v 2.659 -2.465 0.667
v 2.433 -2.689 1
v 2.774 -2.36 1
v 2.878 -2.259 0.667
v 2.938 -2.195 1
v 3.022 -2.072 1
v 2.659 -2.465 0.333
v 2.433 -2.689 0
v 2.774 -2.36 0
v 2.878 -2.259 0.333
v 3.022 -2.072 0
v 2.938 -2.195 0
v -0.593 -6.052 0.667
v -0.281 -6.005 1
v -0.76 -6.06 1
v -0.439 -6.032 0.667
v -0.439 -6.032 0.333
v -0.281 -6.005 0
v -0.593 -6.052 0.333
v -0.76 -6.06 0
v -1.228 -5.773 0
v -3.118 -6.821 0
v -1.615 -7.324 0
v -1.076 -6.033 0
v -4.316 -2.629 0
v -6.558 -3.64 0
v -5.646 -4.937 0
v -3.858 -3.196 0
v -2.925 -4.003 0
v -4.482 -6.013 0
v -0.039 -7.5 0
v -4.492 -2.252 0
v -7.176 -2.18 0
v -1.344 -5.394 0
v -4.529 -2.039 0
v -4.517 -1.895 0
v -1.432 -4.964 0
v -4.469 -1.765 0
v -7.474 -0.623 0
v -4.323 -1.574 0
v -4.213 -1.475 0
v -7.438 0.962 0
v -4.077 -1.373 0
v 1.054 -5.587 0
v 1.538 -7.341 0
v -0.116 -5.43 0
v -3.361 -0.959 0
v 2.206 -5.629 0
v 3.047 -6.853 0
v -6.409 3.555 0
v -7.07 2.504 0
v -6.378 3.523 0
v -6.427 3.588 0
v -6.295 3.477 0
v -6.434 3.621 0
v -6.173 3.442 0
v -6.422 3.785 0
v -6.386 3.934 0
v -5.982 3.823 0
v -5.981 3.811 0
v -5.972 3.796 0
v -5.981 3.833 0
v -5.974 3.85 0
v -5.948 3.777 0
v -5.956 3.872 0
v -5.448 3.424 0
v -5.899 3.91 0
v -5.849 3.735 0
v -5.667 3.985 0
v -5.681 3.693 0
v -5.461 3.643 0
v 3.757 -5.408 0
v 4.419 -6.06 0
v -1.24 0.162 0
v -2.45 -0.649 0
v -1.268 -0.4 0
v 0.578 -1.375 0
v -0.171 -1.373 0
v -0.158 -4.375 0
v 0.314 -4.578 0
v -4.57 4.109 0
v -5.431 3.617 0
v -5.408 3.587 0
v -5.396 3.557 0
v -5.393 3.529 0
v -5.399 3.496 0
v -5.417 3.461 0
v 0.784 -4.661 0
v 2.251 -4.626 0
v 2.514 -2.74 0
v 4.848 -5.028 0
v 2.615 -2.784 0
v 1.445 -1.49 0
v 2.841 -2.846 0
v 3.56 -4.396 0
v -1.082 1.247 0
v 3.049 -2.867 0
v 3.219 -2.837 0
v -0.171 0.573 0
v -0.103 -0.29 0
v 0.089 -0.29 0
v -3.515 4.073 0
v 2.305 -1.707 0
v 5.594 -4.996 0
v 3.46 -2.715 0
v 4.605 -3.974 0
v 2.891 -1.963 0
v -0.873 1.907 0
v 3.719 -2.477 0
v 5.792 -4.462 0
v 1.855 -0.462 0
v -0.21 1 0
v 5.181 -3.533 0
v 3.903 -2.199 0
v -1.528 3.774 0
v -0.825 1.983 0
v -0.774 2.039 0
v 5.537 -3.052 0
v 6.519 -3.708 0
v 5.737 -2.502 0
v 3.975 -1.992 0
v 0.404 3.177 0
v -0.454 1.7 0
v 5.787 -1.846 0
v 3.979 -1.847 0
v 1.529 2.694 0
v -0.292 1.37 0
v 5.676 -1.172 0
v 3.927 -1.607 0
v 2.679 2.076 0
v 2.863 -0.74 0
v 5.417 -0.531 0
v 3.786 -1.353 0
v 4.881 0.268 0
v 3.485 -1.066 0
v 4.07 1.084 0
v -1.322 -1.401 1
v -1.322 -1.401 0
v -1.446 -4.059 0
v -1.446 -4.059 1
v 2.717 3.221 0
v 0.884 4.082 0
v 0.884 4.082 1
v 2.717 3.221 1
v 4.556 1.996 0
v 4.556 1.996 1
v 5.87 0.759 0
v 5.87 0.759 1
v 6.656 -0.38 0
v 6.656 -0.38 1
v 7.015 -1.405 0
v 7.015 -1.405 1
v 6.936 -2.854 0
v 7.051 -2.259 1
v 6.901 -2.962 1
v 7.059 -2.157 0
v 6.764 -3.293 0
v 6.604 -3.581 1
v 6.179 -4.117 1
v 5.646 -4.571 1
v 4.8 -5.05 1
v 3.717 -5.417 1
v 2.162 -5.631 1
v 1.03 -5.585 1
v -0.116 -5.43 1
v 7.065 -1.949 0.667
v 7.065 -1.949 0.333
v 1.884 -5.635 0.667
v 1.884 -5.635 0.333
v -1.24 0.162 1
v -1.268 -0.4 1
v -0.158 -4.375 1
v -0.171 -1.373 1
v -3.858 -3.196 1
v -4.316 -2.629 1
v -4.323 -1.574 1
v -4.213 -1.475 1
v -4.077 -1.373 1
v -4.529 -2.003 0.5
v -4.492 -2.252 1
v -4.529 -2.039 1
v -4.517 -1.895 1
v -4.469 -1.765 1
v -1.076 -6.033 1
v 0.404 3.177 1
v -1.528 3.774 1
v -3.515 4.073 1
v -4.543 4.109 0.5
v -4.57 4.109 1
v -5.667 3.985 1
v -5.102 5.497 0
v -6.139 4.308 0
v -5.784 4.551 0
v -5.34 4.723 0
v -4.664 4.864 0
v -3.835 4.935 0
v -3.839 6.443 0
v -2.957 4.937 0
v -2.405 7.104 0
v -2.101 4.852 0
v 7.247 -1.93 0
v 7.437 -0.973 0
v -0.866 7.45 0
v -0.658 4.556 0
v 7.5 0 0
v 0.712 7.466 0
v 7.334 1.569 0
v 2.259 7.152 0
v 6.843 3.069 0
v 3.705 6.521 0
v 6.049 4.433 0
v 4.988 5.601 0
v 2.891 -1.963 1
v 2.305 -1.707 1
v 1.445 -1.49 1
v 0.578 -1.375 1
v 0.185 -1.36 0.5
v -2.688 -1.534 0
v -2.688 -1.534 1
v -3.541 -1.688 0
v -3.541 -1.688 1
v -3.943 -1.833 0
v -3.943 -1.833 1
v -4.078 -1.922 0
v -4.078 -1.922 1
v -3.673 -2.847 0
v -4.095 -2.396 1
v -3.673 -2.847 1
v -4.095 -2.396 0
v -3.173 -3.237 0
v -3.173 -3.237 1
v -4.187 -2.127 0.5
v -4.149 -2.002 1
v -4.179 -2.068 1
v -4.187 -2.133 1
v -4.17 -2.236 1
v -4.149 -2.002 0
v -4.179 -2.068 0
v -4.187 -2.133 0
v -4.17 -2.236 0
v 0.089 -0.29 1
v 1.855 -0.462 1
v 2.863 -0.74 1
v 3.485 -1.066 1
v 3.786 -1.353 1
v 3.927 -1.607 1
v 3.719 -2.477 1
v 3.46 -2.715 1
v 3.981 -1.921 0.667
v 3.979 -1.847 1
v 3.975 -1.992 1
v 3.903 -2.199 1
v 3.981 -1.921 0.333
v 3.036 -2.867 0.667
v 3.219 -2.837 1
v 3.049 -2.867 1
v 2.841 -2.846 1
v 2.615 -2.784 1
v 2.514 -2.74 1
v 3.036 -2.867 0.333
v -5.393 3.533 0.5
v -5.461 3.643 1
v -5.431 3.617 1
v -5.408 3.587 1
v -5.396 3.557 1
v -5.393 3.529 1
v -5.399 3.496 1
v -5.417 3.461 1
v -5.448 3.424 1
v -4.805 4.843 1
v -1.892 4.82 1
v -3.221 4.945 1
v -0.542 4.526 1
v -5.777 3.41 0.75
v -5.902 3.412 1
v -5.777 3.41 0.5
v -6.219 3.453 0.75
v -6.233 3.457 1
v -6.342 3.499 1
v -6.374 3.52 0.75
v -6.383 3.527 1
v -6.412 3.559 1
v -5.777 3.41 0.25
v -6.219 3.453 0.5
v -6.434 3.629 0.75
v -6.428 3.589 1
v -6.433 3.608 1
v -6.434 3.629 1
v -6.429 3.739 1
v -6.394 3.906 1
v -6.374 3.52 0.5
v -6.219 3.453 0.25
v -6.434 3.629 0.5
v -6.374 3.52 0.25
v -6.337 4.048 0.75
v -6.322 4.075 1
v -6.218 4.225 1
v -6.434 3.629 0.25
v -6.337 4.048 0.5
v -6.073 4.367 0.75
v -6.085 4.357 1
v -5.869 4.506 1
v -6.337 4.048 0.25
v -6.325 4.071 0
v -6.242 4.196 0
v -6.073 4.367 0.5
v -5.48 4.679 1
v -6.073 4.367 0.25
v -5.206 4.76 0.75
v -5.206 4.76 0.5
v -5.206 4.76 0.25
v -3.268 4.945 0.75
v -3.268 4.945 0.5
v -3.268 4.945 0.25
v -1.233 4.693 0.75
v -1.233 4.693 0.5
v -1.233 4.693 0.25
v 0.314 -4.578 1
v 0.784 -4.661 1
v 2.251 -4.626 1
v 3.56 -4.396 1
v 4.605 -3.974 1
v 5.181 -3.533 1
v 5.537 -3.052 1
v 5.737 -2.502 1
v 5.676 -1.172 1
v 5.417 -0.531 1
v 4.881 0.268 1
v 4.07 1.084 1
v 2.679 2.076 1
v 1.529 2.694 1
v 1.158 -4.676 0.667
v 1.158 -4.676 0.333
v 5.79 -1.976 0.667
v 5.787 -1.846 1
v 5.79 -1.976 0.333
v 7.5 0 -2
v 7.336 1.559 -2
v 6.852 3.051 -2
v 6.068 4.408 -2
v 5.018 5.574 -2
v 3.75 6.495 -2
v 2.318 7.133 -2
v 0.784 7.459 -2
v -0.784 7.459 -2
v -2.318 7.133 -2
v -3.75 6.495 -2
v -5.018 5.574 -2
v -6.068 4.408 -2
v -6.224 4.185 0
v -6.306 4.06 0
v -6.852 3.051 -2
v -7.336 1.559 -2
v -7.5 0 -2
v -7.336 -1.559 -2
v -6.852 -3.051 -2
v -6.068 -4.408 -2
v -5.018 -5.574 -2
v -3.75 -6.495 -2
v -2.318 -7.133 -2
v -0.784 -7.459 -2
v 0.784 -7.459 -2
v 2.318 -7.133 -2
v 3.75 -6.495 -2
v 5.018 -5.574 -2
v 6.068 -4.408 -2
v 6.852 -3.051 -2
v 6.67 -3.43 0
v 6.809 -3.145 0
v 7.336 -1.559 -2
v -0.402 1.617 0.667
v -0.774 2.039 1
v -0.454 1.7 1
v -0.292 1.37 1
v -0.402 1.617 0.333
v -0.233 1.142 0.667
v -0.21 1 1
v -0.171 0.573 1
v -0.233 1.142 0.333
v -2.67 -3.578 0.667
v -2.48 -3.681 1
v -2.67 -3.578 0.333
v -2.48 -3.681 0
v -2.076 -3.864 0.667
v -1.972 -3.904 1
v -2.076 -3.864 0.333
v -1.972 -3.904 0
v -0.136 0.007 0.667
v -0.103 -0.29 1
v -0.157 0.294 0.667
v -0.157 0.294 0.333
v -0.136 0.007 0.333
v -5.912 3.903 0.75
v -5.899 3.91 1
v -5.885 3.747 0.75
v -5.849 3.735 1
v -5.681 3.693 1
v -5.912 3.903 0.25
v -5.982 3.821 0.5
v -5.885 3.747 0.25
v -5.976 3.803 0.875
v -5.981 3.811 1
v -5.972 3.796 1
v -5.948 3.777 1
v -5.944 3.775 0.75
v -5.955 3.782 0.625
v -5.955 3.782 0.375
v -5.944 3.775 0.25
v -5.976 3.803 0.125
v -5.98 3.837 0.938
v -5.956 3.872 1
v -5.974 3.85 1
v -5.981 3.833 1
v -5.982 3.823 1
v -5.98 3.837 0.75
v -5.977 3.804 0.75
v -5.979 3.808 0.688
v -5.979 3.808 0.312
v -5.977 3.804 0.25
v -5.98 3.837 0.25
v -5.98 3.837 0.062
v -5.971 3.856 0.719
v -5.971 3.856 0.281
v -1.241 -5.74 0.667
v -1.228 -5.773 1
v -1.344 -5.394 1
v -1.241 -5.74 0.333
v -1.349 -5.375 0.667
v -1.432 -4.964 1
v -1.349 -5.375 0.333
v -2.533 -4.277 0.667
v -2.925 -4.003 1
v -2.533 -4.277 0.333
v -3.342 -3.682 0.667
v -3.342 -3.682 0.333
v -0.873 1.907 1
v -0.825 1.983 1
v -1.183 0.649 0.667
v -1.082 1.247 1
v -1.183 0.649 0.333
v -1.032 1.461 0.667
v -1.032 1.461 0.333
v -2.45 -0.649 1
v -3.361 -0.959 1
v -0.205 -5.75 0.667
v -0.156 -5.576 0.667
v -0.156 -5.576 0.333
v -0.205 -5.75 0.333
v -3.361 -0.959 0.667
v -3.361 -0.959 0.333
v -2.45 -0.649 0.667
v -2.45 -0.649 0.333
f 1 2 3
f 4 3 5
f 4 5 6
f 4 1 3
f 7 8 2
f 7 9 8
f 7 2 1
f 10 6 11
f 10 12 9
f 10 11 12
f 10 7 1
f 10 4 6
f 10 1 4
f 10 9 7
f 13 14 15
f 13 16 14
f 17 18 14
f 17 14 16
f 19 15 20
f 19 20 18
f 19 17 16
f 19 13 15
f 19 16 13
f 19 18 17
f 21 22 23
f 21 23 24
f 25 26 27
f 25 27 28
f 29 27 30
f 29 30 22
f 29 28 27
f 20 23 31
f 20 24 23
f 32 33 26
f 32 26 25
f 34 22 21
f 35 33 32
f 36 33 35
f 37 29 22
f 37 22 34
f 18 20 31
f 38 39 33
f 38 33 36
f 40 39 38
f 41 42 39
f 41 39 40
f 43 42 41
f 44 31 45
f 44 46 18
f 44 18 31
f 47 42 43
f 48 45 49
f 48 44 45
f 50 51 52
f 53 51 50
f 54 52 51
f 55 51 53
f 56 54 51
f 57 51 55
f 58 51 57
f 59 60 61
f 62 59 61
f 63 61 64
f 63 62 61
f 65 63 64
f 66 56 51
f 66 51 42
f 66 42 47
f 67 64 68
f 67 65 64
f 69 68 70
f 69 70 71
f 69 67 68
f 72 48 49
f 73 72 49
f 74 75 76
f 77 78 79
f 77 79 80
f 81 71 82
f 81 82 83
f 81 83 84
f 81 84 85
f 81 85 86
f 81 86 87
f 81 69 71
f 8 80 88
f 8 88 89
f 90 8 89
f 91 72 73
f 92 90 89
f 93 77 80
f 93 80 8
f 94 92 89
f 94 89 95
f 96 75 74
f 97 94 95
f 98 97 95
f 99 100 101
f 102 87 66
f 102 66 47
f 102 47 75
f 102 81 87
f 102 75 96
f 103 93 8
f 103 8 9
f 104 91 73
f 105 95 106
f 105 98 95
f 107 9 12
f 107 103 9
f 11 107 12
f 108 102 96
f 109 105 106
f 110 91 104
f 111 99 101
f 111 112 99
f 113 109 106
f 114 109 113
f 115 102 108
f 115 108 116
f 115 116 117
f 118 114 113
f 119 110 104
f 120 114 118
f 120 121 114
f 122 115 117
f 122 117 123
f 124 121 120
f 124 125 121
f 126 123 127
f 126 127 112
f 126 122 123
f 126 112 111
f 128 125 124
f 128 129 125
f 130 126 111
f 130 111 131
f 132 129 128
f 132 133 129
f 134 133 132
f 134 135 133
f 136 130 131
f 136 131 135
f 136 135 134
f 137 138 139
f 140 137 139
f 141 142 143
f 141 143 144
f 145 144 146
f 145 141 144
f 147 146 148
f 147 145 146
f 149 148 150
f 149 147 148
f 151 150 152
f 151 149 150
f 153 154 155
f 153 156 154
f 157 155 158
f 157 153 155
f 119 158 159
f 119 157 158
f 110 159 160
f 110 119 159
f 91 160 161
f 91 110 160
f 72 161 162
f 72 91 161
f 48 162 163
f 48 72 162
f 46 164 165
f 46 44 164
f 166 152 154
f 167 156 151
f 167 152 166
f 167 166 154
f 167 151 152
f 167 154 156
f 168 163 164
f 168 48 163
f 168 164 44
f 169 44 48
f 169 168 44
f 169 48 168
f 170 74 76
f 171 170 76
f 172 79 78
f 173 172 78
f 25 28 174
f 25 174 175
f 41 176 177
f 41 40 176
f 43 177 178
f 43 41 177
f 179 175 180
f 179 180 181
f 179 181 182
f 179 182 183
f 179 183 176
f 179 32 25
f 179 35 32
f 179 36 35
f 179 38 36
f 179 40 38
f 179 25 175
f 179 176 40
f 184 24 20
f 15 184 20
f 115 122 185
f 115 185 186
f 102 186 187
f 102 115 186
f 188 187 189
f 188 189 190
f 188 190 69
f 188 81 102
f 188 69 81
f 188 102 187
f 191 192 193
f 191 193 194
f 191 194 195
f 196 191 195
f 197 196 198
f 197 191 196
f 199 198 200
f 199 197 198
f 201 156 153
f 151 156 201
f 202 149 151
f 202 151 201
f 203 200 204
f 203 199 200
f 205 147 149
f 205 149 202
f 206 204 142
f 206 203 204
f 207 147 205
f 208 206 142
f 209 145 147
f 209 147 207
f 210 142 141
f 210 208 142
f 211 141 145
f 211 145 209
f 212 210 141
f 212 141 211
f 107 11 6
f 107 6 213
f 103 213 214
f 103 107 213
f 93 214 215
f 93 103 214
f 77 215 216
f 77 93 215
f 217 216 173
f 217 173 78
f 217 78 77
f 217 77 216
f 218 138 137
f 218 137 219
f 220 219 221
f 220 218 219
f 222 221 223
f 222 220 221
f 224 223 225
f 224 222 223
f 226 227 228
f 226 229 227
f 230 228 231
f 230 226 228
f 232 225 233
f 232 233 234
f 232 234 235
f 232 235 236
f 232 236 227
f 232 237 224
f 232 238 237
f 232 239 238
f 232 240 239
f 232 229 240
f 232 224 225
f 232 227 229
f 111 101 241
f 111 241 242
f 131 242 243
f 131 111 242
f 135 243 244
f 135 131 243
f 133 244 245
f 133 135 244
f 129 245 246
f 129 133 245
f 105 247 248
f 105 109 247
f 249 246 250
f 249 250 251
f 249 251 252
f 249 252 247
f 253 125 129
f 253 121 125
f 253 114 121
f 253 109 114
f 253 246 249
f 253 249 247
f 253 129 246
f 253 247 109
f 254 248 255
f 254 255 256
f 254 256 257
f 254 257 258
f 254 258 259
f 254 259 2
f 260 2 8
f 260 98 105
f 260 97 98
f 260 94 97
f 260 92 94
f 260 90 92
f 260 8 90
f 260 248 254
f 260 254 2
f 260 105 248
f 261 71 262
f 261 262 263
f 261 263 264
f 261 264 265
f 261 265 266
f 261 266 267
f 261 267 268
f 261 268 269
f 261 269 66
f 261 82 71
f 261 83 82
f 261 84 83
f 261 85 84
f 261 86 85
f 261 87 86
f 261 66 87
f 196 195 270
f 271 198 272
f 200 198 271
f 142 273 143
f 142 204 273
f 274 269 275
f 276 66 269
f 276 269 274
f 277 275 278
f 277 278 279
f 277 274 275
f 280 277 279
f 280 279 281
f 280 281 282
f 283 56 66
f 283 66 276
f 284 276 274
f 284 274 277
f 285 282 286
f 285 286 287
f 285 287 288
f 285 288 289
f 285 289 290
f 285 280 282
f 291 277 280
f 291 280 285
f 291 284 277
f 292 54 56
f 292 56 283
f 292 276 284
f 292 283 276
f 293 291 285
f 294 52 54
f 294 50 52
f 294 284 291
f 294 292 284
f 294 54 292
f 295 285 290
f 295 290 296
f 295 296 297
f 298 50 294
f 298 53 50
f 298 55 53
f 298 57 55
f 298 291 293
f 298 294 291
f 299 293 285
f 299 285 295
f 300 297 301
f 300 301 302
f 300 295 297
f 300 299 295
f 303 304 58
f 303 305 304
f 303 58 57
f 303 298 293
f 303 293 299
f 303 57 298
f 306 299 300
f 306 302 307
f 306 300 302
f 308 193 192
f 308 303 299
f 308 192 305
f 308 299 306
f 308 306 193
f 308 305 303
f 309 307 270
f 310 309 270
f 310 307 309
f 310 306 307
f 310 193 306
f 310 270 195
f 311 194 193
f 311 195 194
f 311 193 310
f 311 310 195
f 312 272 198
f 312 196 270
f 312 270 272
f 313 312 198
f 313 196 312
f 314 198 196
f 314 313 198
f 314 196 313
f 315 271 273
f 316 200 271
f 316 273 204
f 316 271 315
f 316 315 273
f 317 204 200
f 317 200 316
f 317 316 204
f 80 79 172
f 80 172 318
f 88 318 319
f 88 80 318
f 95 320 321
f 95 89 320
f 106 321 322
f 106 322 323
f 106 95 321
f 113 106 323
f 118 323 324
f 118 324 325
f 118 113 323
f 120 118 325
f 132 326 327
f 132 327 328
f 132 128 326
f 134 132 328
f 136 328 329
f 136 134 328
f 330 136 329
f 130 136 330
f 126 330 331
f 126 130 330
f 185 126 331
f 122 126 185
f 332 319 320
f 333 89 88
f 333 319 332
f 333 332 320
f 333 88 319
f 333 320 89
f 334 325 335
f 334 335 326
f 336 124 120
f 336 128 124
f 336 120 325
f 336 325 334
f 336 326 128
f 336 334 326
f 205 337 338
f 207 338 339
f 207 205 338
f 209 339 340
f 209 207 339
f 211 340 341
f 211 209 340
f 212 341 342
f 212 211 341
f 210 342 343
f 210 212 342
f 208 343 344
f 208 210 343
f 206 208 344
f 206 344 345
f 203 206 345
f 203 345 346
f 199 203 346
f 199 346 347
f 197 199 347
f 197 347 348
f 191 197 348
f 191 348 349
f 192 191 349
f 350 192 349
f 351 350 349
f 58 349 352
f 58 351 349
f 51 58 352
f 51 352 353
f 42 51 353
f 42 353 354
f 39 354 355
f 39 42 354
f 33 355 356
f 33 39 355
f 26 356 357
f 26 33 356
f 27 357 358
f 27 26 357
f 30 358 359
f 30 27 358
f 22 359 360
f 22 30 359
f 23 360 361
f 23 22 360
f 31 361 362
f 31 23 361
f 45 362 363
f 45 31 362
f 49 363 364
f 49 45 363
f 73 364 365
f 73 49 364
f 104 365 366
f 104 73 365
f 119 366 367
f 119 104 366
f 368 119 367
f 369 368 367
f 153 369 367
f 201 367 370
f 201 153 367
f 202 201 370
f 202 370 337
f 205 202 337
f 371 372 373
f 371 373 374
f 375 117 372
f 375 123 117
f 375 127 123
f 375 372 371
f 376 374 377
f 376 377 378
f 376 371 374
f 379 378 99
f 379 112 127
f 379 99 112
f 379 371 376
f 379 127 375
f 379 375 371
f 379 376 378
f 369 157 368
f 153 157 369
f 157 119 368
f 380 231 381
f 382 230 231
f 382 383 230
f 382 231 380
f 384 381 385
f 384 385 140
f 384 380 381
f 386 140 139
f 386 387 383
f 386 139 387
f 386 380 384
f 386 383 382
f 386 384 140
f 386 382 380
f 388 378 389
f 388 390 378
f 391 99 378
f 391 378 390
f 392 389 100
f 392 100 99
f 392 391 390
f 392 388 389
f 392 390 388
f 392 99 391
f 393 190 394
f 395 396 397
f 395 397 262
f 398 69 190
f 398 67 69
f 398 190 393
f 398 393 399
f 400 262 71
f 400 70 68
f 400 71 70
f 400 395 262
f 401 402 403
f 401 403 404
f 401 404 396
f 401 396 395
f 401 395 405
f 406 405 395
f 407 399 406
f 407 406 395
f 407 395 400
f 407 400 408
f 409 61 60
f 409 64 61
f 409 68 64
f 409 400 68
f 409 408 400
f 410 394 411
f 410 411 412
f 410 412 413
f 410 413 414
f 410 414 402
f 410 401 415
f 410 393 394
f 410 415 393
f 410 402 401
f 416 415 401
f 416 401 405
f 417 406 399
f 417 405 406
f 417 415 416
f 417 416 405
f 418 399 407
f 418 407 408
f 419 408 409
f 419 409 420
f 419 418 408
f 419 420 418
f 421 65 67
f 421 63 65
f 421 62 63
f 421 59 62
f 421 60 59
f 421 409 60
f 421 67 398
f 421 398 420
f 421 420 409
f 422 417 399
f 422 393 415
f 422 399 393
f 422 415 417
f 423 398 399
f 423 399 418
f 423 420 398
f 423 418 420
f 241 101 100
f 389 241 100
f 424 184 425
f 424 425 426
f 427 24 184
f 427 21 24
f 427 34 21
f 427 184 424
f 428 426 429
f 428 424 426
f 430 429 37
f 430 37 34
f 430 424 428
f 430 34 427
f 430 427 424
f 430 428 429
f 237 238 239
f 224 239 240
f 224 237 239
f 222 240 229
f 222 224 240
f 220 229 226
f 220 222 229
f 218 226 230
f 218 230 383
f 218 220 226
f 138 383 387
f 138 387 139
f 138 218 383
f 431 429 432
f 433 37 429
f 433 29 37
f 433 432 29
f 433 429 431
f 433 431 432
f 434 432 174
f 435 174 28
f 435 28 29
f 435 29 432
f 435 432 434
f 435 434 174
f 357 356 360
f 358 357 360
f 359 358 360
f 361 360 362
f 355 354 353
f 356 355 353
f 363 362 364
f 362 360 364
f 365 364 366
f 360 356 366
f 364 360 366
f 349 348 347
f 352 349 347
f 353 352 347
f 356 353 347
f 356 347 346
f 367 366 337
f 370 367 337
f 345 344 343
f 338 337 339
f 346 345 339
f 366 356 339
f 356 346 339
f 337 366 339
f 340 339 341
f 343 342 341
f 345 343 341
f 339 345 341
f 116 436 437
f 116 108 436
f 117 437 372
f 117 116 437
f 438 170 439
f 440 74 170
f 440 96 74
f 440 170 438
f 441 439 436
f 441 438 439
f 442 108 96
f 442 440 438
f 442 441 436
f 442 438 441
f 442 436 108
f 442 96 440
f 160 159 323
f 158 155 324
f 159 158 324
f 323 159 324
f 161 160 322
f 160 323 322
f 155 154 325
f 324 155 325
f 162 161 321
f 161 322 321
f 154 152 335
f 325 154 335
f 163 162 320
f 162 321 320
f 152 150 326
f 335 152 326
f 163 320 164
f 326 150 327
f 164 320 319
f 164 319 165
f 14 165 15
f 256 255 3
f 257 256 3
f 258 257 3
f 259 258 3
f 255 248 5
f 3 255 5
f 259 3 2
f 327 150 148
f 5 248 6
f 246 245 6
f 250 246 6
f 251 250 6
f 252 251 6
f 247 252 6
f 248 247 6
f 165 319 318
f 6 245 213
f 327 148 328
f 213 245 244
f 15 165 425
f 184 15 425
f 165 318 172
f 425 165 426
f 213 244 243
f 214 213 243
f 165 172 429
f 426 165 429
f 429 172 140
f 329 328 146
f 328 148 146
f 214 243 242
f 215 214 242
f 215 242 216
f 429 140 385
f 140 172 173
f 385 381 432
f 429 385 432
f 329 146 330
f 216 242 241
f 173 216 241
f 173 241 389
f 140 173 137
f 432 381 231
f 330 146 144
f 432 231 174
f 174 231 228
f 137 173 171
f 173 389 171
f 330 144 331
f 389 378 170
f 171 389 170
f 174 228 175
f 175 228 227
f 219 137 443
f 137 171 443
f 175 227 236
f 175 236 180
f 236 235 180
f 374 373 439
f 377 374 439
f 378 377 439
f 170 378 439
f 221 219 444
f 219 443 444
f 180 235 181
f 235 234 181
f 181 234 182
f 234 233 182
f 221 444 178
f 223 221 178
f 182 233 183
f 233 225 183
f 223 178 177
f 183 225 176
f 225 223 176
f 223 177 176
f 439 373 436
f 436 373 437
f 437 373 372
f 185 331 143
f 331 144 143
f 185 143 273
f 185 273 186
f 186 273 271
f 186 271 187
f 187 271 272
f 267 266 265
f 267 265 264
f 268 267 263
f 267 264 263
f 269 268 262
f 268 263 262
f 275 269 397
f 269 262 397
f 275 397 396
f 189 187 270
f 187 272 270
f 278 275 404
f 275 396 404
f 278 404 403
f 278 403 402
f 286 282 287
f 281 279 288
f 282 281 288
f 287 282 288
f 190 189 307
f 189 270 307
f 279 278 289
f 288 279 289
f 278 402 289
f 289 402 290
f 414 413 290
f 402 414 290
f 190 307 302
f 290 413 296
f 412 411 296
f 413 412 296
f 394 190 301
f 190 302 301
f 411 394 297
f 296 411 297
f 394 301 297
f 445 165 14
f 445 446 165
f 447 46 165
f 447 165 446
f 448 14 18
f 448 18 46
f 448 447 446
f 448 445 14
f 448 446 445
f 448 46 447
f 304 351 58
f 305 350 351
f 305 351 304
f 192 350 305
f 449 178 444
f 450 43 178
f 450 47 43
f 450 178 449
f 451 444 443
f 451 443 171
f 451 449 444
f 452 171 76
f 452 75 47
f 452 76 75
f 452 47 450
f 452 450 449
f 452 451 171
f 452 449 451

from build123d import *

# Parameters (mm, degrees)
F2_DEPTH = 1
F0_R     = 7.5
F3_DEPTH = 2


with BuildPart() as f2:
    # F1 (on Top) → F2 (new body)
    with BuildSketch(Plane.XY):
        with BuildLine():
            add(Edge.make_bspline(
                [(-5.77653, 3.4098657213), (-6.078156, 3.4098657213), (-6.434366, 3.4509587213), (-6.434366, 3.6293427213)],
                knots=[0, 0, 0, 0, 1, 1, 1, 1], degree=3))
            add(Edge.make_bspline(
                [(-5.44765, 3.4236117213), (-5.502397, 3.4236117213), (-5.625715, 3.4098657213), (-5.77653, 3.4098657213)],
                knots=[0, 0, 0, 0, 1, 1, 1, 1], degree=3))
            add(Edge.make_bspline(
                [(-5.392582, 3.5331847213), (-5.392582, 3.5056927213), (-5.406572, 3.4647037213), (-5.44765, 3.4236117213)],
                knots=[0, 0, 0, 0, 1, 1, 1, 1], degree=3))
            add(Edge.make_bspline(
                [(-5.461317, 3.6430057213), (-5.420317, 3.6155967213), (-5.392582, 3.5744217213), (-5.392582, 3.5331847213)],
                knots=[0, 0, 0, 0, 1, 1, 1, 1], degree=3))
            add(Edge.make_bspline(
                [(-5.982168, 3.8209967213), (-5.982168, 3.7251697213), (-5.516142, 3.6704147213), (-5.461317, 3.6430057213)],
                knots=[0, 0, 0, 0, 1, 1, 1, 1], degree=3))
            add(Edge.make_bspline(
                [(-5.666957, 3.9853877213), (-5.899848, 3.9305697213), (-5.982168, 3.8758147213), (-5.982168, 3.8209967213)],
                knots=[0, 0, 0, 0, 1, 1, 1, 1], degree=3))
            add(Edge.make_bspline(
                [(-4.543174, 4.1089547213), (-4.913132, 4.1089547213), (-5.296757, 4.0816077213), (-5.666957, 3.9853877213)],
                knots=[0, 0, 0, 0, 1, 1, 1, 1], degree=3))
            add(Edge.make_bspline(
                [(0.404403, 3.1769747213), (-1.212754, 3.7935677213), (-2.747726, 4.1089547213), (-4.543174, 4.1089547213)],
                knots=[0, 0, 0, 0, 1, 1, 1, 1], degree=3))
            add(Edge.make_bspline(
                [(5.790405, -1.9759082787), (5.790405, 0.4358937213), (2.706778, 2.2999987213), (0.404403, 3.1769747213)],
                knots=[0, 0, 0, 0, 1, 1, 1, 1], degree=3))
            add(Edge.make_bspline(
                [(1.15806, -4.6758282787), (2.665541, -4.6758282787), (5.790405, -4.4156052787), (5.790405, -1.9759082787)],
                knots=[0, 0, 0, 0, 1, 1, 1, 1], degree=3))
            add(Edge.make_bspline(
                [(-0.157621, -4.3746052787), (0.280919, -4.6484962787), (0.815596, -4.6758282787), (1.15806, -4.6758282787)],
                knots=[0, 0, 0, 0, 1, 1, 1, 1], degree=3))
            Line((-0.157621, -4.3746052787), (-0.171367, -1.3730612787))
            add(Edge.make_bspline(
                [(0.185092, -1.3595432787), (0.006935, -1.3595432787), (-0.061546, -1.3595432787), (-0.171367, -1.3730612787)],
                knots=[0, 0, 0, 0, 1, 1, 1, 1], degree=3))
            add(Edge.make_bspline(
                [(3.021999, -2.0719632787), (2.74787, -1.7432652787), (1.267881, -1.3595432787), (0.185092, -1.3595432787)],
                knots=[0, 0, 0, 0, 1, 1, 1, 1], degree=3))
            add(Edge.make_bspline(
                [(2.432649, -2.6887222787), (2.638297, -2.4556862787), (2.939669, -2.2502862787), (3.021999, -2.0719632787)],
                knots=[0, 0, 0, 0, 1, 1, 1, 1], degree=3))
            add(Edge.make_bspline(
                [(3.035745, -2.8668792787), (2.871189, -2.8668792787), (2.569713, -2.7982952787), (2.432649, -2.6887222787)],
                knots=[0, 0, 0, 0, 1, 1, 1, 1], degree=3))
            add(Edge.make_bspline(
                [(3.98147, -1.9211532787), (3.98147, -2.2502862787), (3.501776, -2.8668792787), (3.035745, -2.8668792787)],
                knots=[0, 0, 0, 0, 1, 1, 1, 1], degree=3))
            add(Edge.make_bspline(
                [(0.089264, -0.2902712787), (1.048487, -0.2902712787), (3.98147, -0.5371572787), (3.98147, -1.9211532787)],
                knots=[0, 0, 0, 0, 1, 1, 1, 1], degree=3))
            Line((0.089264, -0.2902712787), (-0.102638, -0.2902712787))
            add(Edge.make_bspline(
                [(-0.171367, 0.5731237213), (-0.157621, 0.2989957213), (-0.143875, 0.0109557213), (-0.102638, -0.2902712787)],
                knots=[0, 0, 0, 0, 1, 1, 1, 1], degree=3))
            add(Edge.make_bspline(
                [(-0.774214, 2.0394497213), (-0.267194, 1.6282567213), (-0.212356, 1.2034627213), (-0.171367, 0.5731237213)],
                knots=[0, 0, 0, 0, 1, 1, 1, 1], degree=3))
            add(Edge.make_bspline(
                [(-1.240245, 0.1619307213), (-1.2265, 0.2989957213), (-1.089435, 1.7653217213), (-0.774214, 2.0394497213)],
                knots=[0, 0, 0, 0, 1, 1, 1, 1], degree=3))
            Line((-1.240245, 0.1619307213), (-1.267737, -0.4000932787))
            add(Edge.make_bspline(
                [(-4.076904, -1.3730612787), (-3.432903, -0.8935332787), (-2.610661, -0.6329842787), (-1.267737, -0.4000932787)],
                knots=[0, 0, 0, 0, 1, 1, 1, 1], degree=3))
            add(Edge.make_bspline(
                [(-4.529347, -2.0034002787), (-4.529347, -1.7842542787), (-4.392281, -1.5922072787), (-4.076904, -1.3730612787)],
                knots=[0, 0, 0, 0, 1, 1, 1, 1], degree=3))
            add(Edge.make_bspline(
                [(-3.857759, -3.1957632787), (-4.17298, -2.8668792787), (-4.529347, -2.4283392787), (-4.529347, -2.0034002787)],
                knots=[0, 0, 0, 0, 1, 1, 1, 1], degree=3))
            add(Edge.make_bspline(
                [(-1.432044, -4.9637092787), (-2.679225, -4.2372972787), (-3.487803, -3.6207022787), (-3.857759, -3.1957632787)],
                knots=[0, 0, 0, 0, 1, 1, 1, 1], degree=3))
            add(Edge.make_bspline(
                [(-1.075834, -6.0325022787), (-1.281483, -5.7861052787), (-1.349818, -5.3886542787), (-1.432044, -4.9637092787)],
                knots=[0, 0, 0, 0, 1, 1, 1, 1], degree=3))
            Line((-1.075834, -6.0325022787), (-0.760468, -6.0599962787))
            add(Edge.make_bspline(
                [(-0.28094, -6.0052512787), (-0.445247, -6.0325022787), (-0.582312, -6.0599962787), (-0.760468, -6.0599962787)],
                knots=[0, 0, 0, 0, 1, 1, 1, 1], degree=3))
            add(Edge.make_bspline(
                [(-0.116384, -5.4296532787), (-0.157621, -5.5803042787), (-0.184864, -5.6902802787), (-0.28094, -6.0052512787)],
                knots=[0, 0, 0, 0, 1, 1, 1, 1], degree=3))
            add(Edge.make_bspline(
                [(1.884474, -5.6354552787), (1.254053, -5.6354552787), (0.500209, -5.5254782787), (-0.116384, -5.4296532787)],
                knots=[0, 0, 0, 0, 1, 1, 1, 1], degree=3))
            add(Edge.make_bspline(
                [(7.065098, -1.9486452787), (7.065098, -4.4429372787), (4.378918, -5.6354552787), (1.884474, -5.6354552787)],
                knots=[0, 0, 0, 0, 1, 1, 1, 1], degree=3))
            add(Edge.make_bspline(
                [(0.883931, 4.0816077213), (2.925924, 3.3413857213), (7.065098, 0.8743507213), (7.065098, -1.9486452787)],
                knots=[0, 0, 0, 0, 1, 1, 1, 1], degree=3))
            add(Edge.make_bspline(
                [(-3.268492, 4.9450037213), (-2.035057, 4.9450037213), (-0.458993, 4.5612187213), (0.883931, 4.0816077213)],
                knots=[0, 0, 0, 0, 1, 1, 1, 1], degree=3))
            add(Edge.make_bspline(
                [(-6.434366, 3.6293427213), (-6.434366, 4.8898547213), (-4.214217, 4.9450037213), (-3.268492, 4.9450037213)],
                knots=[0, 0, 0, 0, 1, 1, 1, 1], degree=3))
        make_face()
        with BuildLine():
            add(Edge.make_bspline(
                [(-1.322472, -1.4005532787), (-2.679225, -1.5101262787), (-4.186726, -1.6470242787), (-4.186726, -2.1269672787)],
                knots=[0, 0, 0, 0, 1, 1, 1, 1], degree=3))
            Line((-1.322472, -1.4005532787), (-1.44579, -4.0592332787))
            add(Edge.make_bspline(
                [(-3.17252, -3.2367522787), (-2.73398, -3.5932102787), (-2.07615, -3.9223222787), (-1.44579, -4.0592332787)],
                knots=[0, 0, 0, 0, 1, 1, 1, 1], degree=3))
            add(Edge.make_bspline(
                [(-4.186726, -2.1269672787), (-4.186726, -2.4966742787), (-3.556387, -2.9489602787), (-3.17252, -3.2367522787)],
                knots=[0, 0, 0, 0, 1, 1, 1, 1], degree=3))
        make_face(mode=Mode.SUBTRACT)
    extrude(amount=F2_DEPTH)

    # F0 (on Top) → F3 (join)
    with BuildSketch(Plane.XY):
        Circle(F0_R)
    extrude(amount=-F3_DEPTH)


solid = f2.part
